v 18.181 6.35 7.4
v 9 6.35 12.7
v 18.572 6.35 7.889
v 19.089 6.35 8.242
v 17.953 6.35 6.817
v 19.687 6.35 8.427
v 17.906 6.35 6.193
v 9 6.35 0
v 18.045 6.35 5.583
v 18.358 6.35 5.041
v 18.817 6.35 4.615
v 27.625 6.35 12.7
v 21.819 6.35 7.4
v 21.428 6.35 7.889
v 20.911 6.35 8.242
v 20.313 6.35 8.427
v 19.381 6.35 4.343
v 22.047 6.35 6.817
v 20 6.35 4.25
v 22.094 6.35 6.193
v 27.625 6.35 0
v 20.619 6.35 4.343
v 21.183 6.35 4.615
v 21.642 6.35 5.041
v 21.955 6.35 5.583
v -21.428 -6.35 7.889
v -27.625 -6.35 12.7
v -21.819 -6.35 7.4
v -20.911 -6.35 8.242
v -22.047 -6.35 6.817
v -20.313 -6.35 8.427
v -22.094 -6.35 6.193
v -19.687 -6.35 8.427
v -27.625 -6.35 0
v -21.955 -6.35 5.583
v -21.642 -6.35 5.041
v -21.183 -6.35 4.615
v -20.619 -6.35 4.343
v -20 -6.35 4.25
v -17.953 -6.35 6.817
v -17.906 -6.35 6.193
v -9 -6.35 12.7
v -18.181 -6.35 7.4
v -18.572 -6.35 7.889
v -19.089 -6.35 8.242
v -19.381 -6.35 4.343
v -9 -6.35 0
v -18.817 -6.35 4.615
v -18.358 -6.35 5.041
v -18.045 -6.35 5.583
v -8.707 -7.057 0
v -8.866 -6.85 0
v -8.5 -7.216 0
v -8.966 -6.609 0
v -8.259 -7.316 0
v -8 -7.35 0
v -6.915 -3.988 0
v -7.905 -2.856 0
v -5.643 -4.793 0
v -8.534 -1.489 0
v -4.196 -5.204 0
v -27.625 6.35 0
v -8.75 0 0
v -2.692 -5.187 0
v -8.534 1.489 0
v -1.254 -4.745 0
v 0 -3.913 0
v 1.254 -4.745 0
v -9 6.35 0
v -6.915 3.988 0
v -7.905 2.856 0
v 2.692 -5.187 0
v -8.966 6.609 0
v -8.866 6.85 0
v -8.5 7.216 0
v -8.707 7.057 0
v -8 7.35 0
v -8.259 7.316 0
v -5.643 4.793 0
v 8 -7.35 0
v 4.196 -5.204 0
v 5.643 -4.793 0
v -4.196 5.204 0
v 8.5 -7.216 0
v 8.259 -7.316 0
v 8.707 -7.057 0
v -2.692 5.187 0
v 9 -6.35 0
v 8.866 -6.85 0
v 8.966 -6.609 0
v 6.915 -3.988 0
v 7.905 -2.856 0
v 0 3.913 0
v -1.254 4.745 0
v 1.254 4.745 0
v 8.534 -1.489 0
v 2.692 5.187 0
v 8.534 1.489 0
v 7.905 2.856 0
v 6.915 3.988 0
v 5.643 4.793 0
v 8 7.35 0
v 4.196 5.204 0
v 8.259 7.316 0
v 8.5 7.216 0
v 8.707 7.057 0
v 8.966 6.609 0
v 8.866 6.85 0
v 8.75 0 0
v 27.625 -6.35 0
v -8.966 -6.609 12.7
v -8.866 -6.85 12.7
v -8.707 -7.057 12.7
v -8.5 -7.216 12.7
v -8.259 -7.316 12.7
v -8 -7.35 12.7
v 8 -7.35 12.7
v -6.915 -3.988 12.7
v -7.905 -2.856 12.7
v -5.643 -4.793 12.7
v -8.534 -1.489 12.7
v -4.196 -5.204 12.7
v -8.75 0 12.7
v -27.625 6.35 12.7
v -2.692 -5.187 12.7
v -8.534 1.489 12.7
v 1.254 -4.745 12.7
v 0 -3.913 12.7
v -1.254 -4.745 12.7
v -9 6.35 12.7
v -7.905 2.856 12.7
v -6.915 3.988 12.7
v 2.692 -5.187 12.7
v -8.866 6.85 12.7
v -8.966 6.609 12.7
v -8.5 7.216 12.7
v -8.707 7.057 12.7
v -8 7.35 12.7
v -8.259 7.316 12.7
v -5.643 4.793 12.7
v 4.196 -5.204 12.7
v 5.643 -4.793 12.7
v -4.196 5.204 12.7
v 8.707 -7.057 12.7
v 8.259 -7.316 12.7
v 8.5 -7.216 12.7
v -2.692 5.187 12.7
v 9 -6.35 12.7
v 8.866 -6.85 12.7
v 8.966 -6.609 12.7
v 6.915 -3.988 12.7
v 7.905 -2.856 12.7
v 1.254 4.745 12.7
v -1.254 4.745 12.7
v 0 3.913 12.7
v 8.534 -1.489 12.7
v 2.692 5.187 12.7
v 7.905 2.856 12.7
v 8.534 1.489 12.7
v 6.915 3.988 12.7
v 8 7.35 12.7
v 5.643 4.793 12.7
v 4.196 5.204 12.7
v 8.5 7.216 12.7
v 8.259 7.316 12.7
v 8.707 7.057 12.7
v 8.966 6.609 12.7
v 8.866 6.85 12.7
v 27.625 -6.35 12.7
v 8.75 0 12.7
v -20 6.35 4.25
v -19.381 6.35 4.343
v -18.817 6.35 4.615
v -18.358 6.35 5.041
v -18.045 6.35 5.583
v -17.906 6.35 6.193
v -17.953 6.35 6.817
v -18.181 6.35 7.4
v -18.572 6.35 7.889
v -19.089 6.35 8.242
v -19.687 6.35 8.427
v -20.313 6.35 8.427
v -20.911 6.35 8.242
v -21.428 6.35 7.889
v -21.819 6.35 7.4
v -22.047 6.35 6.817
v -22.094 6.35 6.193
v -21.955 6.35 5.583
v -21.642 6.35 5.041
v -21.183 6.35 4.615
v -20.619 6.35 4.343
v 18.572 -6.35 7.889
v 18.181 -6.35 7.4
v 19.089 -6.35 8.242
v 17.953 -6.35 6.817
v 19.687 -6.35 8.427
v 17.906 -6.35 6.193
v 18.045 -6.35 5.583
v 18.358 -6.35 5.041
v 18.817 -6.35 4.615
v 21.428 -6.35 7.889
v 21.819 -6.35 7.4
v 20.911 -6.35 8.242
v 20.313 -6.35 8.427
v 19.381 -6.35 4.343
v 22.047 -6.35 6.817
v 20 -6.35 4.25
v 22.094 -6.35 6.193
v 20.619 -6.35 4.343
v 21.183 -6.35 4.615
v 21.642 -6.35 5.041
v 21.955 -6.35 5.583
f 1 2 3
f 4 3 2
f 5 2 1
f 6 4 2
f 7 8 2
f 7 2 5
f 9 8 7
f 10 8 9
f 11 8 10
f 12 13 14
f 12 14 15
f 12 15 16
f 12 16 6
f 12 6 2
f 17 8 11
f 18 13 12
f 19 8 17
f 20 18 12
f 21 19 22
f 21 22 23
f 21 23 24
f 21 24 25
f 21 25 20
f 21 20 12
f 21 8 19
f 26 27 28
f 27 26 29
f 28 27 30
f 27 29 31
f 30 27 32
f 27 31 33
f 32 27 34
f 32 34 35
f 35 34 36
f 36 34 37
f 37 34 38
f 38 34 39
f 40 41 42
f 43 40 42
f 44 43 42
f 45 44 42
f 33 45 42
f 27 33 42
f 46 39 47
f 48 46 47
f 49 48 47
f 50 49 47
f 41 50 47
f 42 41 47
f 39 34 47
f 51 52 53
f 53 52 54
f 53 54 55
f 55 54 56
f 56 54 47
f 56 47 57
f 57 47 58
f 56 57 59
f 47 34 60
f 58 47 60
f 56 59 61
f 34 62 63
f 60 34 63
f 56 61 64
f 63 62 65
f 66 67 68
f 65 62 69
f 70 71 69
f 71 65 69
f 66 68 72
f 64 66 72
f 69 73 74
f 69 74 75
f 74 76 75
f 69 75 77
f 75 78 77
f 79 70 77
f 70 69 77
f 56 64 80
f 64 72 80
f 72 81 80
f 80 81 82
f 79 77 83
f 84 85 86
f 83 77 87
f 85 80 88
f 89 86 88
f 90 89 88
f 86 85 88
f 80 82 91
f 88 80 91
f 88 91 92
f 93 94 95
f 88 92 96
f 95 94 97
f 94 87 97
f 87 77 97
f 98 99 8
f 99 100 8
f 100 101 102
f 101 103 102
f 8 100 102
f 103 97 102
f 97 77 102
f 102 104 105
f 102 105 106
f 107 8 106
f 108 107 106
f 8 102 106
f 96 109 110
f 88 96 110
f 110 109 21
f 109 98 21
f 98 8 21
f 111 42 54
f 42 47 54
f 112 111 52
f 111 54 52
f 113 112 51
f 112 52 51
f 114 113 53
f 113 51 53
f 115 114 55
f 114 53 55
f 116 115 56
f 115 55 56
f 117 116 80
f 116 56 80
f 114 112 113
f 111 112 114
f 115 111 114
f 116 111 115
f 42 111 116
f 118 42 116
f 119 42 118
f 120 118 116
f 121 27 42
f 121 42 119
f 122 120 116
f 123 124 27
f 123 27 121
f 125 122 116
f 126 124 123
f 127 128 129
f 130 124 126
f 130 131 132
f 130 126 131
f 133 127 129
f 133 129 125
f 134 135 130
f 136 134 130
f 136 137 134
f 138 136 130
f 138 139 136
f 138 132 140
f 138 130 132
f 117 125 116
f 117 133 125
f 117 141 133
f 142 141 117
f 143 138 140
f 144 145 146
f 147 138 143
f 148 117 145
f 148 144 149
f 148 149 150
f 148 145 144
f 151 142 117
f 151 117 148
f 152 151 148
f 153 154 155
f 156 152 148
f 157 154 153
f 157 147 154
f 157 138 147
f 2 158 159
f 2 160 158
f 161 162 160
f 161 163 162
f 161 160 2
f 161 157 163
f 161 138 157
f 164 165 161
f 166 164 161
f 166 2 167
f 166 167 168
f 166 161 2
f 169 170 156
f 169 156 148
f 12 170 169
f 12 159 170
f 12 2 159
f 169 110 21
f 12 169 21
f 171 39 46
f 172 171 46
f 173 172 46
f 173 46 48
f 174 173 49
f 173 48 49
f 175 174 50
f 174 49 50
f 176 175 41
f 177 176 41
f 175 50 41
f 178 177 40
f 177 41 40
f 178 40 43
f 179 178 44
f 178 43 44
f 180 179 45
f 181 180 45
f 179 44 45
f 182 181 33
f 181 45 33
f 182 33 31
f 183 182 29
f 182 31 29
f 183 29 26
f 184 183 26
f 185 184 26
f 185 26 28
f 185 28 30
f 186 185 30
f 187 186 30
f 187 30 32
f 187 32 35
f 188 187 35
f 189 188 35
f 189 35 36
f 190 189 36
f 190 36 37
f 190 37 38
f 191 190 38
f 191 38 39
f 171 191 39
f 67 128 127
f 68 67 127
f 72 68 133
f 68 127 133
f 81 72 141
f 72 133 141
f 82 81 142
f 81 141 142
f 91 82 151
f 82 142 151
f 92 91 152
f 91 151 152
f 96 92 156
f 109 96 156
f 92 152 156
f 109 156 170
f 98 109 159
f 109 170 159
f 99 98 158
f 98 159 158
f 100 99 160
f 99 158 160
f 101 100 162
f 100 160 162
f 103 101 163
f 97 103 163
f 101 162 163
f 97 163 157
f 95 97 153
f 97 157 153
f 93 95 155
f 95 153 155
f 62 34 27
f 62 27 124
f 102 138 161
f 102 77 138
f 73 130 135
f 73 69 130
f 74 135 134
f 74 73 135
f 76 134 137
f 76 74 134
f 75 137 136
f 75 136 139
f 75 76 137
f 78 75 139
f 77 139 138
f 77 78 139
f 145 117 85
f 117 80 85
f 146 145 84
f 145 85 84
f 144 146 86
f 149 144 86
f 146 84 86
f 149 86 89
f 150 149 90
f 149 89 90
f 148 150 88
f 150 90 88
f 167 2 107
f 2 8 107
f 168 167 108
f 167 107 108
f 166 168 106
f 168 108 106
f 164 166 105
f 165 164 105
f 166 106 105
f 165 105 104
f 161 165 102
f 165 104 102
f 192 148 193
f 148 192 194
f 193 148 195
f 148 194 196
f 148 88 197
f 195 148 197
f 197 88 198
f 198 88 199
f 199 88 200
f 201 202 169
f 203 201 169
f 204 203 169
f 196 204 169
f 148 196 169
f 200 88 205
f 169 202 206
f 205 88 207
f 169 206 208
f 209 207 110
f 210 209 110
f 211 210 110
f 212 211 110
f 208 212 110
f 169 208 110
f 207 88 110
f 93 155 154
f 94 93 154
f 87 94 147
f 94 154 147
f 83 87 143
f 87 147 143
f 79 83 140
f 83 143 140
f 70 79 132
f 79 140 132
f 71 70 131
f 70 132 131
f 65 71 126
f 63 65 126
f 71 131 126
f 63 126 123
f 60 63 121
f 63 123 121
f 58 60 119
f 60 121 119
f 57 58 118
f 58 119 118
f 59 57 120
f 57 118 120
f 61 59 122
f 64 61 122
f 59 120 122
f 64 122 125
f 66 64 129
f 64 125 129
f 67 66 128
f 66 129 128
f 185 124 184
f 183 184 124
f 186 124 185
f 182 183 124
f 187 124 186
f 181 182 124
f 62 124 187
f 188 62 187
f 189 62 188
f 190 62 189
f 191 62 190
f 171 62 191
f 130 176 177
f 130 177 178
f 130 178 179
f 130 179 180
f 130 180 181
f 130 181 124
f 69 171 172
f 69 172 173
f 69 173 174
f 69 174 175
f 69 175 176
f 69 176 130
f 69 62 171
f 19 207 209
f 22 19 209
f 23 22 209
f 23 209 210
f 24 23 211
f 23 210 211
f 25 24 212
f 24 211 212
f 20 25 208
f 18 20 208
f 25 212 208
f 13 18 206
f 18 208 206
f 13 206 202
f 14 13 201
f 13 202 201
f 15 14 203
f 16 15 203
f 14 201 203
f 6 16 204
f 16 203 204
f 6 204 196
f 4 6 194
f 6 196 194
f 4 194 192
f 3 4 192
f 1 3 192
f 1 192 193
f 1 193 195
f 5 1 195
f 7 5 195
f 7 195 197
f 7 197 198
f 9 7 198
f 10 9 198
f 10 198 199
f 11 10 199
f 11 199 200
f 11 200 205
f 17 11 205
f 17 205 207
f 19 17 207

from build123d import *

# Parameters (mm, degrees)
SKETCH1_W             = 55.25
SKETCH1_H             = 12.7
BOSS_EXTRUDE1_DEPTH   = 12.7
M5X0_8_TAPPED_HOLE1_D = 4.2
CUT_EXTRUDE1_DEPTH    = 32.060475286
SKETCH5_W             = 18
SKETCH5_H             = 12.7
BOSS_EXTRUDE2_DEPTH   = 1
FILLET1_R             = 1


with BuildPart() as part:
    # Sketch1 → Boss-Extrude1 (new body)
    with BuildSketch(Plane.XY):
        Rectangle(SKETCH1_W, SKETCH1_H)
    extrude(amount=BOSS_EXTRUDE1_DEPTH)

    # M5x0.8 Tapped Hole1 (through all)
    with Locations(Plane(origin=(-20, 6.35, 6.35), x_dir=(0, 0, 1), z_dir=(0, 1, 0))):
        with Locations((0, 0), (0, 40)):
            Hole(M5X0_8_TAPPED_HOLE1_D / 2)

    # Sketch4 → Cut-Extrude1 (cut, through all)
    with BuildSketch(Plane.XY.offset(12.7)):
        with BuildLine():
            ThreePointArc((0, 3.913118961), (-8.75, 0), (0, -3.913118961))
            ThreePointArc((0, -3.913118961), (8.75, 0), (0, 3.913118961))
        make_face()
    extrude(amount=-CUT_EXTRUDE1_DEPTH, mode=Mode.SUBTRACT)

    # Sketch5 → Boss-Extrude2 (add)
    with BuildSketch(Plane(origin=(0, 6.35, 0), x_dir=(1, 0, 0), z_dir=(0, 1, 0))):
        with Locations((0, -6.35)):
            Rectangle(SKETCH5_W, SKETCH5_H)
    boss_extrude2 = extrude(amount=BOSS_EXTRUDE2_DEPTH)

    # Mirror1: Boss-Extrude2 across plane
    add(boss_extrude2.mirror(Plane.ZX))

    # Fillet1
    fillet1_edges = [part.edges().sort_by_distance(p)[0] for p in [
        (9, -7.35, 6.35),
        (-9, -7.35, 6.35),
        (-9, 7.35, 6.35),
        (9, 7.35, 6.35),
    ]]
    fillet(fillet1_edges, radius=FILLET1_R - 0.0001)  # a hair under: the kernel refuses the full size


solid = part.part
